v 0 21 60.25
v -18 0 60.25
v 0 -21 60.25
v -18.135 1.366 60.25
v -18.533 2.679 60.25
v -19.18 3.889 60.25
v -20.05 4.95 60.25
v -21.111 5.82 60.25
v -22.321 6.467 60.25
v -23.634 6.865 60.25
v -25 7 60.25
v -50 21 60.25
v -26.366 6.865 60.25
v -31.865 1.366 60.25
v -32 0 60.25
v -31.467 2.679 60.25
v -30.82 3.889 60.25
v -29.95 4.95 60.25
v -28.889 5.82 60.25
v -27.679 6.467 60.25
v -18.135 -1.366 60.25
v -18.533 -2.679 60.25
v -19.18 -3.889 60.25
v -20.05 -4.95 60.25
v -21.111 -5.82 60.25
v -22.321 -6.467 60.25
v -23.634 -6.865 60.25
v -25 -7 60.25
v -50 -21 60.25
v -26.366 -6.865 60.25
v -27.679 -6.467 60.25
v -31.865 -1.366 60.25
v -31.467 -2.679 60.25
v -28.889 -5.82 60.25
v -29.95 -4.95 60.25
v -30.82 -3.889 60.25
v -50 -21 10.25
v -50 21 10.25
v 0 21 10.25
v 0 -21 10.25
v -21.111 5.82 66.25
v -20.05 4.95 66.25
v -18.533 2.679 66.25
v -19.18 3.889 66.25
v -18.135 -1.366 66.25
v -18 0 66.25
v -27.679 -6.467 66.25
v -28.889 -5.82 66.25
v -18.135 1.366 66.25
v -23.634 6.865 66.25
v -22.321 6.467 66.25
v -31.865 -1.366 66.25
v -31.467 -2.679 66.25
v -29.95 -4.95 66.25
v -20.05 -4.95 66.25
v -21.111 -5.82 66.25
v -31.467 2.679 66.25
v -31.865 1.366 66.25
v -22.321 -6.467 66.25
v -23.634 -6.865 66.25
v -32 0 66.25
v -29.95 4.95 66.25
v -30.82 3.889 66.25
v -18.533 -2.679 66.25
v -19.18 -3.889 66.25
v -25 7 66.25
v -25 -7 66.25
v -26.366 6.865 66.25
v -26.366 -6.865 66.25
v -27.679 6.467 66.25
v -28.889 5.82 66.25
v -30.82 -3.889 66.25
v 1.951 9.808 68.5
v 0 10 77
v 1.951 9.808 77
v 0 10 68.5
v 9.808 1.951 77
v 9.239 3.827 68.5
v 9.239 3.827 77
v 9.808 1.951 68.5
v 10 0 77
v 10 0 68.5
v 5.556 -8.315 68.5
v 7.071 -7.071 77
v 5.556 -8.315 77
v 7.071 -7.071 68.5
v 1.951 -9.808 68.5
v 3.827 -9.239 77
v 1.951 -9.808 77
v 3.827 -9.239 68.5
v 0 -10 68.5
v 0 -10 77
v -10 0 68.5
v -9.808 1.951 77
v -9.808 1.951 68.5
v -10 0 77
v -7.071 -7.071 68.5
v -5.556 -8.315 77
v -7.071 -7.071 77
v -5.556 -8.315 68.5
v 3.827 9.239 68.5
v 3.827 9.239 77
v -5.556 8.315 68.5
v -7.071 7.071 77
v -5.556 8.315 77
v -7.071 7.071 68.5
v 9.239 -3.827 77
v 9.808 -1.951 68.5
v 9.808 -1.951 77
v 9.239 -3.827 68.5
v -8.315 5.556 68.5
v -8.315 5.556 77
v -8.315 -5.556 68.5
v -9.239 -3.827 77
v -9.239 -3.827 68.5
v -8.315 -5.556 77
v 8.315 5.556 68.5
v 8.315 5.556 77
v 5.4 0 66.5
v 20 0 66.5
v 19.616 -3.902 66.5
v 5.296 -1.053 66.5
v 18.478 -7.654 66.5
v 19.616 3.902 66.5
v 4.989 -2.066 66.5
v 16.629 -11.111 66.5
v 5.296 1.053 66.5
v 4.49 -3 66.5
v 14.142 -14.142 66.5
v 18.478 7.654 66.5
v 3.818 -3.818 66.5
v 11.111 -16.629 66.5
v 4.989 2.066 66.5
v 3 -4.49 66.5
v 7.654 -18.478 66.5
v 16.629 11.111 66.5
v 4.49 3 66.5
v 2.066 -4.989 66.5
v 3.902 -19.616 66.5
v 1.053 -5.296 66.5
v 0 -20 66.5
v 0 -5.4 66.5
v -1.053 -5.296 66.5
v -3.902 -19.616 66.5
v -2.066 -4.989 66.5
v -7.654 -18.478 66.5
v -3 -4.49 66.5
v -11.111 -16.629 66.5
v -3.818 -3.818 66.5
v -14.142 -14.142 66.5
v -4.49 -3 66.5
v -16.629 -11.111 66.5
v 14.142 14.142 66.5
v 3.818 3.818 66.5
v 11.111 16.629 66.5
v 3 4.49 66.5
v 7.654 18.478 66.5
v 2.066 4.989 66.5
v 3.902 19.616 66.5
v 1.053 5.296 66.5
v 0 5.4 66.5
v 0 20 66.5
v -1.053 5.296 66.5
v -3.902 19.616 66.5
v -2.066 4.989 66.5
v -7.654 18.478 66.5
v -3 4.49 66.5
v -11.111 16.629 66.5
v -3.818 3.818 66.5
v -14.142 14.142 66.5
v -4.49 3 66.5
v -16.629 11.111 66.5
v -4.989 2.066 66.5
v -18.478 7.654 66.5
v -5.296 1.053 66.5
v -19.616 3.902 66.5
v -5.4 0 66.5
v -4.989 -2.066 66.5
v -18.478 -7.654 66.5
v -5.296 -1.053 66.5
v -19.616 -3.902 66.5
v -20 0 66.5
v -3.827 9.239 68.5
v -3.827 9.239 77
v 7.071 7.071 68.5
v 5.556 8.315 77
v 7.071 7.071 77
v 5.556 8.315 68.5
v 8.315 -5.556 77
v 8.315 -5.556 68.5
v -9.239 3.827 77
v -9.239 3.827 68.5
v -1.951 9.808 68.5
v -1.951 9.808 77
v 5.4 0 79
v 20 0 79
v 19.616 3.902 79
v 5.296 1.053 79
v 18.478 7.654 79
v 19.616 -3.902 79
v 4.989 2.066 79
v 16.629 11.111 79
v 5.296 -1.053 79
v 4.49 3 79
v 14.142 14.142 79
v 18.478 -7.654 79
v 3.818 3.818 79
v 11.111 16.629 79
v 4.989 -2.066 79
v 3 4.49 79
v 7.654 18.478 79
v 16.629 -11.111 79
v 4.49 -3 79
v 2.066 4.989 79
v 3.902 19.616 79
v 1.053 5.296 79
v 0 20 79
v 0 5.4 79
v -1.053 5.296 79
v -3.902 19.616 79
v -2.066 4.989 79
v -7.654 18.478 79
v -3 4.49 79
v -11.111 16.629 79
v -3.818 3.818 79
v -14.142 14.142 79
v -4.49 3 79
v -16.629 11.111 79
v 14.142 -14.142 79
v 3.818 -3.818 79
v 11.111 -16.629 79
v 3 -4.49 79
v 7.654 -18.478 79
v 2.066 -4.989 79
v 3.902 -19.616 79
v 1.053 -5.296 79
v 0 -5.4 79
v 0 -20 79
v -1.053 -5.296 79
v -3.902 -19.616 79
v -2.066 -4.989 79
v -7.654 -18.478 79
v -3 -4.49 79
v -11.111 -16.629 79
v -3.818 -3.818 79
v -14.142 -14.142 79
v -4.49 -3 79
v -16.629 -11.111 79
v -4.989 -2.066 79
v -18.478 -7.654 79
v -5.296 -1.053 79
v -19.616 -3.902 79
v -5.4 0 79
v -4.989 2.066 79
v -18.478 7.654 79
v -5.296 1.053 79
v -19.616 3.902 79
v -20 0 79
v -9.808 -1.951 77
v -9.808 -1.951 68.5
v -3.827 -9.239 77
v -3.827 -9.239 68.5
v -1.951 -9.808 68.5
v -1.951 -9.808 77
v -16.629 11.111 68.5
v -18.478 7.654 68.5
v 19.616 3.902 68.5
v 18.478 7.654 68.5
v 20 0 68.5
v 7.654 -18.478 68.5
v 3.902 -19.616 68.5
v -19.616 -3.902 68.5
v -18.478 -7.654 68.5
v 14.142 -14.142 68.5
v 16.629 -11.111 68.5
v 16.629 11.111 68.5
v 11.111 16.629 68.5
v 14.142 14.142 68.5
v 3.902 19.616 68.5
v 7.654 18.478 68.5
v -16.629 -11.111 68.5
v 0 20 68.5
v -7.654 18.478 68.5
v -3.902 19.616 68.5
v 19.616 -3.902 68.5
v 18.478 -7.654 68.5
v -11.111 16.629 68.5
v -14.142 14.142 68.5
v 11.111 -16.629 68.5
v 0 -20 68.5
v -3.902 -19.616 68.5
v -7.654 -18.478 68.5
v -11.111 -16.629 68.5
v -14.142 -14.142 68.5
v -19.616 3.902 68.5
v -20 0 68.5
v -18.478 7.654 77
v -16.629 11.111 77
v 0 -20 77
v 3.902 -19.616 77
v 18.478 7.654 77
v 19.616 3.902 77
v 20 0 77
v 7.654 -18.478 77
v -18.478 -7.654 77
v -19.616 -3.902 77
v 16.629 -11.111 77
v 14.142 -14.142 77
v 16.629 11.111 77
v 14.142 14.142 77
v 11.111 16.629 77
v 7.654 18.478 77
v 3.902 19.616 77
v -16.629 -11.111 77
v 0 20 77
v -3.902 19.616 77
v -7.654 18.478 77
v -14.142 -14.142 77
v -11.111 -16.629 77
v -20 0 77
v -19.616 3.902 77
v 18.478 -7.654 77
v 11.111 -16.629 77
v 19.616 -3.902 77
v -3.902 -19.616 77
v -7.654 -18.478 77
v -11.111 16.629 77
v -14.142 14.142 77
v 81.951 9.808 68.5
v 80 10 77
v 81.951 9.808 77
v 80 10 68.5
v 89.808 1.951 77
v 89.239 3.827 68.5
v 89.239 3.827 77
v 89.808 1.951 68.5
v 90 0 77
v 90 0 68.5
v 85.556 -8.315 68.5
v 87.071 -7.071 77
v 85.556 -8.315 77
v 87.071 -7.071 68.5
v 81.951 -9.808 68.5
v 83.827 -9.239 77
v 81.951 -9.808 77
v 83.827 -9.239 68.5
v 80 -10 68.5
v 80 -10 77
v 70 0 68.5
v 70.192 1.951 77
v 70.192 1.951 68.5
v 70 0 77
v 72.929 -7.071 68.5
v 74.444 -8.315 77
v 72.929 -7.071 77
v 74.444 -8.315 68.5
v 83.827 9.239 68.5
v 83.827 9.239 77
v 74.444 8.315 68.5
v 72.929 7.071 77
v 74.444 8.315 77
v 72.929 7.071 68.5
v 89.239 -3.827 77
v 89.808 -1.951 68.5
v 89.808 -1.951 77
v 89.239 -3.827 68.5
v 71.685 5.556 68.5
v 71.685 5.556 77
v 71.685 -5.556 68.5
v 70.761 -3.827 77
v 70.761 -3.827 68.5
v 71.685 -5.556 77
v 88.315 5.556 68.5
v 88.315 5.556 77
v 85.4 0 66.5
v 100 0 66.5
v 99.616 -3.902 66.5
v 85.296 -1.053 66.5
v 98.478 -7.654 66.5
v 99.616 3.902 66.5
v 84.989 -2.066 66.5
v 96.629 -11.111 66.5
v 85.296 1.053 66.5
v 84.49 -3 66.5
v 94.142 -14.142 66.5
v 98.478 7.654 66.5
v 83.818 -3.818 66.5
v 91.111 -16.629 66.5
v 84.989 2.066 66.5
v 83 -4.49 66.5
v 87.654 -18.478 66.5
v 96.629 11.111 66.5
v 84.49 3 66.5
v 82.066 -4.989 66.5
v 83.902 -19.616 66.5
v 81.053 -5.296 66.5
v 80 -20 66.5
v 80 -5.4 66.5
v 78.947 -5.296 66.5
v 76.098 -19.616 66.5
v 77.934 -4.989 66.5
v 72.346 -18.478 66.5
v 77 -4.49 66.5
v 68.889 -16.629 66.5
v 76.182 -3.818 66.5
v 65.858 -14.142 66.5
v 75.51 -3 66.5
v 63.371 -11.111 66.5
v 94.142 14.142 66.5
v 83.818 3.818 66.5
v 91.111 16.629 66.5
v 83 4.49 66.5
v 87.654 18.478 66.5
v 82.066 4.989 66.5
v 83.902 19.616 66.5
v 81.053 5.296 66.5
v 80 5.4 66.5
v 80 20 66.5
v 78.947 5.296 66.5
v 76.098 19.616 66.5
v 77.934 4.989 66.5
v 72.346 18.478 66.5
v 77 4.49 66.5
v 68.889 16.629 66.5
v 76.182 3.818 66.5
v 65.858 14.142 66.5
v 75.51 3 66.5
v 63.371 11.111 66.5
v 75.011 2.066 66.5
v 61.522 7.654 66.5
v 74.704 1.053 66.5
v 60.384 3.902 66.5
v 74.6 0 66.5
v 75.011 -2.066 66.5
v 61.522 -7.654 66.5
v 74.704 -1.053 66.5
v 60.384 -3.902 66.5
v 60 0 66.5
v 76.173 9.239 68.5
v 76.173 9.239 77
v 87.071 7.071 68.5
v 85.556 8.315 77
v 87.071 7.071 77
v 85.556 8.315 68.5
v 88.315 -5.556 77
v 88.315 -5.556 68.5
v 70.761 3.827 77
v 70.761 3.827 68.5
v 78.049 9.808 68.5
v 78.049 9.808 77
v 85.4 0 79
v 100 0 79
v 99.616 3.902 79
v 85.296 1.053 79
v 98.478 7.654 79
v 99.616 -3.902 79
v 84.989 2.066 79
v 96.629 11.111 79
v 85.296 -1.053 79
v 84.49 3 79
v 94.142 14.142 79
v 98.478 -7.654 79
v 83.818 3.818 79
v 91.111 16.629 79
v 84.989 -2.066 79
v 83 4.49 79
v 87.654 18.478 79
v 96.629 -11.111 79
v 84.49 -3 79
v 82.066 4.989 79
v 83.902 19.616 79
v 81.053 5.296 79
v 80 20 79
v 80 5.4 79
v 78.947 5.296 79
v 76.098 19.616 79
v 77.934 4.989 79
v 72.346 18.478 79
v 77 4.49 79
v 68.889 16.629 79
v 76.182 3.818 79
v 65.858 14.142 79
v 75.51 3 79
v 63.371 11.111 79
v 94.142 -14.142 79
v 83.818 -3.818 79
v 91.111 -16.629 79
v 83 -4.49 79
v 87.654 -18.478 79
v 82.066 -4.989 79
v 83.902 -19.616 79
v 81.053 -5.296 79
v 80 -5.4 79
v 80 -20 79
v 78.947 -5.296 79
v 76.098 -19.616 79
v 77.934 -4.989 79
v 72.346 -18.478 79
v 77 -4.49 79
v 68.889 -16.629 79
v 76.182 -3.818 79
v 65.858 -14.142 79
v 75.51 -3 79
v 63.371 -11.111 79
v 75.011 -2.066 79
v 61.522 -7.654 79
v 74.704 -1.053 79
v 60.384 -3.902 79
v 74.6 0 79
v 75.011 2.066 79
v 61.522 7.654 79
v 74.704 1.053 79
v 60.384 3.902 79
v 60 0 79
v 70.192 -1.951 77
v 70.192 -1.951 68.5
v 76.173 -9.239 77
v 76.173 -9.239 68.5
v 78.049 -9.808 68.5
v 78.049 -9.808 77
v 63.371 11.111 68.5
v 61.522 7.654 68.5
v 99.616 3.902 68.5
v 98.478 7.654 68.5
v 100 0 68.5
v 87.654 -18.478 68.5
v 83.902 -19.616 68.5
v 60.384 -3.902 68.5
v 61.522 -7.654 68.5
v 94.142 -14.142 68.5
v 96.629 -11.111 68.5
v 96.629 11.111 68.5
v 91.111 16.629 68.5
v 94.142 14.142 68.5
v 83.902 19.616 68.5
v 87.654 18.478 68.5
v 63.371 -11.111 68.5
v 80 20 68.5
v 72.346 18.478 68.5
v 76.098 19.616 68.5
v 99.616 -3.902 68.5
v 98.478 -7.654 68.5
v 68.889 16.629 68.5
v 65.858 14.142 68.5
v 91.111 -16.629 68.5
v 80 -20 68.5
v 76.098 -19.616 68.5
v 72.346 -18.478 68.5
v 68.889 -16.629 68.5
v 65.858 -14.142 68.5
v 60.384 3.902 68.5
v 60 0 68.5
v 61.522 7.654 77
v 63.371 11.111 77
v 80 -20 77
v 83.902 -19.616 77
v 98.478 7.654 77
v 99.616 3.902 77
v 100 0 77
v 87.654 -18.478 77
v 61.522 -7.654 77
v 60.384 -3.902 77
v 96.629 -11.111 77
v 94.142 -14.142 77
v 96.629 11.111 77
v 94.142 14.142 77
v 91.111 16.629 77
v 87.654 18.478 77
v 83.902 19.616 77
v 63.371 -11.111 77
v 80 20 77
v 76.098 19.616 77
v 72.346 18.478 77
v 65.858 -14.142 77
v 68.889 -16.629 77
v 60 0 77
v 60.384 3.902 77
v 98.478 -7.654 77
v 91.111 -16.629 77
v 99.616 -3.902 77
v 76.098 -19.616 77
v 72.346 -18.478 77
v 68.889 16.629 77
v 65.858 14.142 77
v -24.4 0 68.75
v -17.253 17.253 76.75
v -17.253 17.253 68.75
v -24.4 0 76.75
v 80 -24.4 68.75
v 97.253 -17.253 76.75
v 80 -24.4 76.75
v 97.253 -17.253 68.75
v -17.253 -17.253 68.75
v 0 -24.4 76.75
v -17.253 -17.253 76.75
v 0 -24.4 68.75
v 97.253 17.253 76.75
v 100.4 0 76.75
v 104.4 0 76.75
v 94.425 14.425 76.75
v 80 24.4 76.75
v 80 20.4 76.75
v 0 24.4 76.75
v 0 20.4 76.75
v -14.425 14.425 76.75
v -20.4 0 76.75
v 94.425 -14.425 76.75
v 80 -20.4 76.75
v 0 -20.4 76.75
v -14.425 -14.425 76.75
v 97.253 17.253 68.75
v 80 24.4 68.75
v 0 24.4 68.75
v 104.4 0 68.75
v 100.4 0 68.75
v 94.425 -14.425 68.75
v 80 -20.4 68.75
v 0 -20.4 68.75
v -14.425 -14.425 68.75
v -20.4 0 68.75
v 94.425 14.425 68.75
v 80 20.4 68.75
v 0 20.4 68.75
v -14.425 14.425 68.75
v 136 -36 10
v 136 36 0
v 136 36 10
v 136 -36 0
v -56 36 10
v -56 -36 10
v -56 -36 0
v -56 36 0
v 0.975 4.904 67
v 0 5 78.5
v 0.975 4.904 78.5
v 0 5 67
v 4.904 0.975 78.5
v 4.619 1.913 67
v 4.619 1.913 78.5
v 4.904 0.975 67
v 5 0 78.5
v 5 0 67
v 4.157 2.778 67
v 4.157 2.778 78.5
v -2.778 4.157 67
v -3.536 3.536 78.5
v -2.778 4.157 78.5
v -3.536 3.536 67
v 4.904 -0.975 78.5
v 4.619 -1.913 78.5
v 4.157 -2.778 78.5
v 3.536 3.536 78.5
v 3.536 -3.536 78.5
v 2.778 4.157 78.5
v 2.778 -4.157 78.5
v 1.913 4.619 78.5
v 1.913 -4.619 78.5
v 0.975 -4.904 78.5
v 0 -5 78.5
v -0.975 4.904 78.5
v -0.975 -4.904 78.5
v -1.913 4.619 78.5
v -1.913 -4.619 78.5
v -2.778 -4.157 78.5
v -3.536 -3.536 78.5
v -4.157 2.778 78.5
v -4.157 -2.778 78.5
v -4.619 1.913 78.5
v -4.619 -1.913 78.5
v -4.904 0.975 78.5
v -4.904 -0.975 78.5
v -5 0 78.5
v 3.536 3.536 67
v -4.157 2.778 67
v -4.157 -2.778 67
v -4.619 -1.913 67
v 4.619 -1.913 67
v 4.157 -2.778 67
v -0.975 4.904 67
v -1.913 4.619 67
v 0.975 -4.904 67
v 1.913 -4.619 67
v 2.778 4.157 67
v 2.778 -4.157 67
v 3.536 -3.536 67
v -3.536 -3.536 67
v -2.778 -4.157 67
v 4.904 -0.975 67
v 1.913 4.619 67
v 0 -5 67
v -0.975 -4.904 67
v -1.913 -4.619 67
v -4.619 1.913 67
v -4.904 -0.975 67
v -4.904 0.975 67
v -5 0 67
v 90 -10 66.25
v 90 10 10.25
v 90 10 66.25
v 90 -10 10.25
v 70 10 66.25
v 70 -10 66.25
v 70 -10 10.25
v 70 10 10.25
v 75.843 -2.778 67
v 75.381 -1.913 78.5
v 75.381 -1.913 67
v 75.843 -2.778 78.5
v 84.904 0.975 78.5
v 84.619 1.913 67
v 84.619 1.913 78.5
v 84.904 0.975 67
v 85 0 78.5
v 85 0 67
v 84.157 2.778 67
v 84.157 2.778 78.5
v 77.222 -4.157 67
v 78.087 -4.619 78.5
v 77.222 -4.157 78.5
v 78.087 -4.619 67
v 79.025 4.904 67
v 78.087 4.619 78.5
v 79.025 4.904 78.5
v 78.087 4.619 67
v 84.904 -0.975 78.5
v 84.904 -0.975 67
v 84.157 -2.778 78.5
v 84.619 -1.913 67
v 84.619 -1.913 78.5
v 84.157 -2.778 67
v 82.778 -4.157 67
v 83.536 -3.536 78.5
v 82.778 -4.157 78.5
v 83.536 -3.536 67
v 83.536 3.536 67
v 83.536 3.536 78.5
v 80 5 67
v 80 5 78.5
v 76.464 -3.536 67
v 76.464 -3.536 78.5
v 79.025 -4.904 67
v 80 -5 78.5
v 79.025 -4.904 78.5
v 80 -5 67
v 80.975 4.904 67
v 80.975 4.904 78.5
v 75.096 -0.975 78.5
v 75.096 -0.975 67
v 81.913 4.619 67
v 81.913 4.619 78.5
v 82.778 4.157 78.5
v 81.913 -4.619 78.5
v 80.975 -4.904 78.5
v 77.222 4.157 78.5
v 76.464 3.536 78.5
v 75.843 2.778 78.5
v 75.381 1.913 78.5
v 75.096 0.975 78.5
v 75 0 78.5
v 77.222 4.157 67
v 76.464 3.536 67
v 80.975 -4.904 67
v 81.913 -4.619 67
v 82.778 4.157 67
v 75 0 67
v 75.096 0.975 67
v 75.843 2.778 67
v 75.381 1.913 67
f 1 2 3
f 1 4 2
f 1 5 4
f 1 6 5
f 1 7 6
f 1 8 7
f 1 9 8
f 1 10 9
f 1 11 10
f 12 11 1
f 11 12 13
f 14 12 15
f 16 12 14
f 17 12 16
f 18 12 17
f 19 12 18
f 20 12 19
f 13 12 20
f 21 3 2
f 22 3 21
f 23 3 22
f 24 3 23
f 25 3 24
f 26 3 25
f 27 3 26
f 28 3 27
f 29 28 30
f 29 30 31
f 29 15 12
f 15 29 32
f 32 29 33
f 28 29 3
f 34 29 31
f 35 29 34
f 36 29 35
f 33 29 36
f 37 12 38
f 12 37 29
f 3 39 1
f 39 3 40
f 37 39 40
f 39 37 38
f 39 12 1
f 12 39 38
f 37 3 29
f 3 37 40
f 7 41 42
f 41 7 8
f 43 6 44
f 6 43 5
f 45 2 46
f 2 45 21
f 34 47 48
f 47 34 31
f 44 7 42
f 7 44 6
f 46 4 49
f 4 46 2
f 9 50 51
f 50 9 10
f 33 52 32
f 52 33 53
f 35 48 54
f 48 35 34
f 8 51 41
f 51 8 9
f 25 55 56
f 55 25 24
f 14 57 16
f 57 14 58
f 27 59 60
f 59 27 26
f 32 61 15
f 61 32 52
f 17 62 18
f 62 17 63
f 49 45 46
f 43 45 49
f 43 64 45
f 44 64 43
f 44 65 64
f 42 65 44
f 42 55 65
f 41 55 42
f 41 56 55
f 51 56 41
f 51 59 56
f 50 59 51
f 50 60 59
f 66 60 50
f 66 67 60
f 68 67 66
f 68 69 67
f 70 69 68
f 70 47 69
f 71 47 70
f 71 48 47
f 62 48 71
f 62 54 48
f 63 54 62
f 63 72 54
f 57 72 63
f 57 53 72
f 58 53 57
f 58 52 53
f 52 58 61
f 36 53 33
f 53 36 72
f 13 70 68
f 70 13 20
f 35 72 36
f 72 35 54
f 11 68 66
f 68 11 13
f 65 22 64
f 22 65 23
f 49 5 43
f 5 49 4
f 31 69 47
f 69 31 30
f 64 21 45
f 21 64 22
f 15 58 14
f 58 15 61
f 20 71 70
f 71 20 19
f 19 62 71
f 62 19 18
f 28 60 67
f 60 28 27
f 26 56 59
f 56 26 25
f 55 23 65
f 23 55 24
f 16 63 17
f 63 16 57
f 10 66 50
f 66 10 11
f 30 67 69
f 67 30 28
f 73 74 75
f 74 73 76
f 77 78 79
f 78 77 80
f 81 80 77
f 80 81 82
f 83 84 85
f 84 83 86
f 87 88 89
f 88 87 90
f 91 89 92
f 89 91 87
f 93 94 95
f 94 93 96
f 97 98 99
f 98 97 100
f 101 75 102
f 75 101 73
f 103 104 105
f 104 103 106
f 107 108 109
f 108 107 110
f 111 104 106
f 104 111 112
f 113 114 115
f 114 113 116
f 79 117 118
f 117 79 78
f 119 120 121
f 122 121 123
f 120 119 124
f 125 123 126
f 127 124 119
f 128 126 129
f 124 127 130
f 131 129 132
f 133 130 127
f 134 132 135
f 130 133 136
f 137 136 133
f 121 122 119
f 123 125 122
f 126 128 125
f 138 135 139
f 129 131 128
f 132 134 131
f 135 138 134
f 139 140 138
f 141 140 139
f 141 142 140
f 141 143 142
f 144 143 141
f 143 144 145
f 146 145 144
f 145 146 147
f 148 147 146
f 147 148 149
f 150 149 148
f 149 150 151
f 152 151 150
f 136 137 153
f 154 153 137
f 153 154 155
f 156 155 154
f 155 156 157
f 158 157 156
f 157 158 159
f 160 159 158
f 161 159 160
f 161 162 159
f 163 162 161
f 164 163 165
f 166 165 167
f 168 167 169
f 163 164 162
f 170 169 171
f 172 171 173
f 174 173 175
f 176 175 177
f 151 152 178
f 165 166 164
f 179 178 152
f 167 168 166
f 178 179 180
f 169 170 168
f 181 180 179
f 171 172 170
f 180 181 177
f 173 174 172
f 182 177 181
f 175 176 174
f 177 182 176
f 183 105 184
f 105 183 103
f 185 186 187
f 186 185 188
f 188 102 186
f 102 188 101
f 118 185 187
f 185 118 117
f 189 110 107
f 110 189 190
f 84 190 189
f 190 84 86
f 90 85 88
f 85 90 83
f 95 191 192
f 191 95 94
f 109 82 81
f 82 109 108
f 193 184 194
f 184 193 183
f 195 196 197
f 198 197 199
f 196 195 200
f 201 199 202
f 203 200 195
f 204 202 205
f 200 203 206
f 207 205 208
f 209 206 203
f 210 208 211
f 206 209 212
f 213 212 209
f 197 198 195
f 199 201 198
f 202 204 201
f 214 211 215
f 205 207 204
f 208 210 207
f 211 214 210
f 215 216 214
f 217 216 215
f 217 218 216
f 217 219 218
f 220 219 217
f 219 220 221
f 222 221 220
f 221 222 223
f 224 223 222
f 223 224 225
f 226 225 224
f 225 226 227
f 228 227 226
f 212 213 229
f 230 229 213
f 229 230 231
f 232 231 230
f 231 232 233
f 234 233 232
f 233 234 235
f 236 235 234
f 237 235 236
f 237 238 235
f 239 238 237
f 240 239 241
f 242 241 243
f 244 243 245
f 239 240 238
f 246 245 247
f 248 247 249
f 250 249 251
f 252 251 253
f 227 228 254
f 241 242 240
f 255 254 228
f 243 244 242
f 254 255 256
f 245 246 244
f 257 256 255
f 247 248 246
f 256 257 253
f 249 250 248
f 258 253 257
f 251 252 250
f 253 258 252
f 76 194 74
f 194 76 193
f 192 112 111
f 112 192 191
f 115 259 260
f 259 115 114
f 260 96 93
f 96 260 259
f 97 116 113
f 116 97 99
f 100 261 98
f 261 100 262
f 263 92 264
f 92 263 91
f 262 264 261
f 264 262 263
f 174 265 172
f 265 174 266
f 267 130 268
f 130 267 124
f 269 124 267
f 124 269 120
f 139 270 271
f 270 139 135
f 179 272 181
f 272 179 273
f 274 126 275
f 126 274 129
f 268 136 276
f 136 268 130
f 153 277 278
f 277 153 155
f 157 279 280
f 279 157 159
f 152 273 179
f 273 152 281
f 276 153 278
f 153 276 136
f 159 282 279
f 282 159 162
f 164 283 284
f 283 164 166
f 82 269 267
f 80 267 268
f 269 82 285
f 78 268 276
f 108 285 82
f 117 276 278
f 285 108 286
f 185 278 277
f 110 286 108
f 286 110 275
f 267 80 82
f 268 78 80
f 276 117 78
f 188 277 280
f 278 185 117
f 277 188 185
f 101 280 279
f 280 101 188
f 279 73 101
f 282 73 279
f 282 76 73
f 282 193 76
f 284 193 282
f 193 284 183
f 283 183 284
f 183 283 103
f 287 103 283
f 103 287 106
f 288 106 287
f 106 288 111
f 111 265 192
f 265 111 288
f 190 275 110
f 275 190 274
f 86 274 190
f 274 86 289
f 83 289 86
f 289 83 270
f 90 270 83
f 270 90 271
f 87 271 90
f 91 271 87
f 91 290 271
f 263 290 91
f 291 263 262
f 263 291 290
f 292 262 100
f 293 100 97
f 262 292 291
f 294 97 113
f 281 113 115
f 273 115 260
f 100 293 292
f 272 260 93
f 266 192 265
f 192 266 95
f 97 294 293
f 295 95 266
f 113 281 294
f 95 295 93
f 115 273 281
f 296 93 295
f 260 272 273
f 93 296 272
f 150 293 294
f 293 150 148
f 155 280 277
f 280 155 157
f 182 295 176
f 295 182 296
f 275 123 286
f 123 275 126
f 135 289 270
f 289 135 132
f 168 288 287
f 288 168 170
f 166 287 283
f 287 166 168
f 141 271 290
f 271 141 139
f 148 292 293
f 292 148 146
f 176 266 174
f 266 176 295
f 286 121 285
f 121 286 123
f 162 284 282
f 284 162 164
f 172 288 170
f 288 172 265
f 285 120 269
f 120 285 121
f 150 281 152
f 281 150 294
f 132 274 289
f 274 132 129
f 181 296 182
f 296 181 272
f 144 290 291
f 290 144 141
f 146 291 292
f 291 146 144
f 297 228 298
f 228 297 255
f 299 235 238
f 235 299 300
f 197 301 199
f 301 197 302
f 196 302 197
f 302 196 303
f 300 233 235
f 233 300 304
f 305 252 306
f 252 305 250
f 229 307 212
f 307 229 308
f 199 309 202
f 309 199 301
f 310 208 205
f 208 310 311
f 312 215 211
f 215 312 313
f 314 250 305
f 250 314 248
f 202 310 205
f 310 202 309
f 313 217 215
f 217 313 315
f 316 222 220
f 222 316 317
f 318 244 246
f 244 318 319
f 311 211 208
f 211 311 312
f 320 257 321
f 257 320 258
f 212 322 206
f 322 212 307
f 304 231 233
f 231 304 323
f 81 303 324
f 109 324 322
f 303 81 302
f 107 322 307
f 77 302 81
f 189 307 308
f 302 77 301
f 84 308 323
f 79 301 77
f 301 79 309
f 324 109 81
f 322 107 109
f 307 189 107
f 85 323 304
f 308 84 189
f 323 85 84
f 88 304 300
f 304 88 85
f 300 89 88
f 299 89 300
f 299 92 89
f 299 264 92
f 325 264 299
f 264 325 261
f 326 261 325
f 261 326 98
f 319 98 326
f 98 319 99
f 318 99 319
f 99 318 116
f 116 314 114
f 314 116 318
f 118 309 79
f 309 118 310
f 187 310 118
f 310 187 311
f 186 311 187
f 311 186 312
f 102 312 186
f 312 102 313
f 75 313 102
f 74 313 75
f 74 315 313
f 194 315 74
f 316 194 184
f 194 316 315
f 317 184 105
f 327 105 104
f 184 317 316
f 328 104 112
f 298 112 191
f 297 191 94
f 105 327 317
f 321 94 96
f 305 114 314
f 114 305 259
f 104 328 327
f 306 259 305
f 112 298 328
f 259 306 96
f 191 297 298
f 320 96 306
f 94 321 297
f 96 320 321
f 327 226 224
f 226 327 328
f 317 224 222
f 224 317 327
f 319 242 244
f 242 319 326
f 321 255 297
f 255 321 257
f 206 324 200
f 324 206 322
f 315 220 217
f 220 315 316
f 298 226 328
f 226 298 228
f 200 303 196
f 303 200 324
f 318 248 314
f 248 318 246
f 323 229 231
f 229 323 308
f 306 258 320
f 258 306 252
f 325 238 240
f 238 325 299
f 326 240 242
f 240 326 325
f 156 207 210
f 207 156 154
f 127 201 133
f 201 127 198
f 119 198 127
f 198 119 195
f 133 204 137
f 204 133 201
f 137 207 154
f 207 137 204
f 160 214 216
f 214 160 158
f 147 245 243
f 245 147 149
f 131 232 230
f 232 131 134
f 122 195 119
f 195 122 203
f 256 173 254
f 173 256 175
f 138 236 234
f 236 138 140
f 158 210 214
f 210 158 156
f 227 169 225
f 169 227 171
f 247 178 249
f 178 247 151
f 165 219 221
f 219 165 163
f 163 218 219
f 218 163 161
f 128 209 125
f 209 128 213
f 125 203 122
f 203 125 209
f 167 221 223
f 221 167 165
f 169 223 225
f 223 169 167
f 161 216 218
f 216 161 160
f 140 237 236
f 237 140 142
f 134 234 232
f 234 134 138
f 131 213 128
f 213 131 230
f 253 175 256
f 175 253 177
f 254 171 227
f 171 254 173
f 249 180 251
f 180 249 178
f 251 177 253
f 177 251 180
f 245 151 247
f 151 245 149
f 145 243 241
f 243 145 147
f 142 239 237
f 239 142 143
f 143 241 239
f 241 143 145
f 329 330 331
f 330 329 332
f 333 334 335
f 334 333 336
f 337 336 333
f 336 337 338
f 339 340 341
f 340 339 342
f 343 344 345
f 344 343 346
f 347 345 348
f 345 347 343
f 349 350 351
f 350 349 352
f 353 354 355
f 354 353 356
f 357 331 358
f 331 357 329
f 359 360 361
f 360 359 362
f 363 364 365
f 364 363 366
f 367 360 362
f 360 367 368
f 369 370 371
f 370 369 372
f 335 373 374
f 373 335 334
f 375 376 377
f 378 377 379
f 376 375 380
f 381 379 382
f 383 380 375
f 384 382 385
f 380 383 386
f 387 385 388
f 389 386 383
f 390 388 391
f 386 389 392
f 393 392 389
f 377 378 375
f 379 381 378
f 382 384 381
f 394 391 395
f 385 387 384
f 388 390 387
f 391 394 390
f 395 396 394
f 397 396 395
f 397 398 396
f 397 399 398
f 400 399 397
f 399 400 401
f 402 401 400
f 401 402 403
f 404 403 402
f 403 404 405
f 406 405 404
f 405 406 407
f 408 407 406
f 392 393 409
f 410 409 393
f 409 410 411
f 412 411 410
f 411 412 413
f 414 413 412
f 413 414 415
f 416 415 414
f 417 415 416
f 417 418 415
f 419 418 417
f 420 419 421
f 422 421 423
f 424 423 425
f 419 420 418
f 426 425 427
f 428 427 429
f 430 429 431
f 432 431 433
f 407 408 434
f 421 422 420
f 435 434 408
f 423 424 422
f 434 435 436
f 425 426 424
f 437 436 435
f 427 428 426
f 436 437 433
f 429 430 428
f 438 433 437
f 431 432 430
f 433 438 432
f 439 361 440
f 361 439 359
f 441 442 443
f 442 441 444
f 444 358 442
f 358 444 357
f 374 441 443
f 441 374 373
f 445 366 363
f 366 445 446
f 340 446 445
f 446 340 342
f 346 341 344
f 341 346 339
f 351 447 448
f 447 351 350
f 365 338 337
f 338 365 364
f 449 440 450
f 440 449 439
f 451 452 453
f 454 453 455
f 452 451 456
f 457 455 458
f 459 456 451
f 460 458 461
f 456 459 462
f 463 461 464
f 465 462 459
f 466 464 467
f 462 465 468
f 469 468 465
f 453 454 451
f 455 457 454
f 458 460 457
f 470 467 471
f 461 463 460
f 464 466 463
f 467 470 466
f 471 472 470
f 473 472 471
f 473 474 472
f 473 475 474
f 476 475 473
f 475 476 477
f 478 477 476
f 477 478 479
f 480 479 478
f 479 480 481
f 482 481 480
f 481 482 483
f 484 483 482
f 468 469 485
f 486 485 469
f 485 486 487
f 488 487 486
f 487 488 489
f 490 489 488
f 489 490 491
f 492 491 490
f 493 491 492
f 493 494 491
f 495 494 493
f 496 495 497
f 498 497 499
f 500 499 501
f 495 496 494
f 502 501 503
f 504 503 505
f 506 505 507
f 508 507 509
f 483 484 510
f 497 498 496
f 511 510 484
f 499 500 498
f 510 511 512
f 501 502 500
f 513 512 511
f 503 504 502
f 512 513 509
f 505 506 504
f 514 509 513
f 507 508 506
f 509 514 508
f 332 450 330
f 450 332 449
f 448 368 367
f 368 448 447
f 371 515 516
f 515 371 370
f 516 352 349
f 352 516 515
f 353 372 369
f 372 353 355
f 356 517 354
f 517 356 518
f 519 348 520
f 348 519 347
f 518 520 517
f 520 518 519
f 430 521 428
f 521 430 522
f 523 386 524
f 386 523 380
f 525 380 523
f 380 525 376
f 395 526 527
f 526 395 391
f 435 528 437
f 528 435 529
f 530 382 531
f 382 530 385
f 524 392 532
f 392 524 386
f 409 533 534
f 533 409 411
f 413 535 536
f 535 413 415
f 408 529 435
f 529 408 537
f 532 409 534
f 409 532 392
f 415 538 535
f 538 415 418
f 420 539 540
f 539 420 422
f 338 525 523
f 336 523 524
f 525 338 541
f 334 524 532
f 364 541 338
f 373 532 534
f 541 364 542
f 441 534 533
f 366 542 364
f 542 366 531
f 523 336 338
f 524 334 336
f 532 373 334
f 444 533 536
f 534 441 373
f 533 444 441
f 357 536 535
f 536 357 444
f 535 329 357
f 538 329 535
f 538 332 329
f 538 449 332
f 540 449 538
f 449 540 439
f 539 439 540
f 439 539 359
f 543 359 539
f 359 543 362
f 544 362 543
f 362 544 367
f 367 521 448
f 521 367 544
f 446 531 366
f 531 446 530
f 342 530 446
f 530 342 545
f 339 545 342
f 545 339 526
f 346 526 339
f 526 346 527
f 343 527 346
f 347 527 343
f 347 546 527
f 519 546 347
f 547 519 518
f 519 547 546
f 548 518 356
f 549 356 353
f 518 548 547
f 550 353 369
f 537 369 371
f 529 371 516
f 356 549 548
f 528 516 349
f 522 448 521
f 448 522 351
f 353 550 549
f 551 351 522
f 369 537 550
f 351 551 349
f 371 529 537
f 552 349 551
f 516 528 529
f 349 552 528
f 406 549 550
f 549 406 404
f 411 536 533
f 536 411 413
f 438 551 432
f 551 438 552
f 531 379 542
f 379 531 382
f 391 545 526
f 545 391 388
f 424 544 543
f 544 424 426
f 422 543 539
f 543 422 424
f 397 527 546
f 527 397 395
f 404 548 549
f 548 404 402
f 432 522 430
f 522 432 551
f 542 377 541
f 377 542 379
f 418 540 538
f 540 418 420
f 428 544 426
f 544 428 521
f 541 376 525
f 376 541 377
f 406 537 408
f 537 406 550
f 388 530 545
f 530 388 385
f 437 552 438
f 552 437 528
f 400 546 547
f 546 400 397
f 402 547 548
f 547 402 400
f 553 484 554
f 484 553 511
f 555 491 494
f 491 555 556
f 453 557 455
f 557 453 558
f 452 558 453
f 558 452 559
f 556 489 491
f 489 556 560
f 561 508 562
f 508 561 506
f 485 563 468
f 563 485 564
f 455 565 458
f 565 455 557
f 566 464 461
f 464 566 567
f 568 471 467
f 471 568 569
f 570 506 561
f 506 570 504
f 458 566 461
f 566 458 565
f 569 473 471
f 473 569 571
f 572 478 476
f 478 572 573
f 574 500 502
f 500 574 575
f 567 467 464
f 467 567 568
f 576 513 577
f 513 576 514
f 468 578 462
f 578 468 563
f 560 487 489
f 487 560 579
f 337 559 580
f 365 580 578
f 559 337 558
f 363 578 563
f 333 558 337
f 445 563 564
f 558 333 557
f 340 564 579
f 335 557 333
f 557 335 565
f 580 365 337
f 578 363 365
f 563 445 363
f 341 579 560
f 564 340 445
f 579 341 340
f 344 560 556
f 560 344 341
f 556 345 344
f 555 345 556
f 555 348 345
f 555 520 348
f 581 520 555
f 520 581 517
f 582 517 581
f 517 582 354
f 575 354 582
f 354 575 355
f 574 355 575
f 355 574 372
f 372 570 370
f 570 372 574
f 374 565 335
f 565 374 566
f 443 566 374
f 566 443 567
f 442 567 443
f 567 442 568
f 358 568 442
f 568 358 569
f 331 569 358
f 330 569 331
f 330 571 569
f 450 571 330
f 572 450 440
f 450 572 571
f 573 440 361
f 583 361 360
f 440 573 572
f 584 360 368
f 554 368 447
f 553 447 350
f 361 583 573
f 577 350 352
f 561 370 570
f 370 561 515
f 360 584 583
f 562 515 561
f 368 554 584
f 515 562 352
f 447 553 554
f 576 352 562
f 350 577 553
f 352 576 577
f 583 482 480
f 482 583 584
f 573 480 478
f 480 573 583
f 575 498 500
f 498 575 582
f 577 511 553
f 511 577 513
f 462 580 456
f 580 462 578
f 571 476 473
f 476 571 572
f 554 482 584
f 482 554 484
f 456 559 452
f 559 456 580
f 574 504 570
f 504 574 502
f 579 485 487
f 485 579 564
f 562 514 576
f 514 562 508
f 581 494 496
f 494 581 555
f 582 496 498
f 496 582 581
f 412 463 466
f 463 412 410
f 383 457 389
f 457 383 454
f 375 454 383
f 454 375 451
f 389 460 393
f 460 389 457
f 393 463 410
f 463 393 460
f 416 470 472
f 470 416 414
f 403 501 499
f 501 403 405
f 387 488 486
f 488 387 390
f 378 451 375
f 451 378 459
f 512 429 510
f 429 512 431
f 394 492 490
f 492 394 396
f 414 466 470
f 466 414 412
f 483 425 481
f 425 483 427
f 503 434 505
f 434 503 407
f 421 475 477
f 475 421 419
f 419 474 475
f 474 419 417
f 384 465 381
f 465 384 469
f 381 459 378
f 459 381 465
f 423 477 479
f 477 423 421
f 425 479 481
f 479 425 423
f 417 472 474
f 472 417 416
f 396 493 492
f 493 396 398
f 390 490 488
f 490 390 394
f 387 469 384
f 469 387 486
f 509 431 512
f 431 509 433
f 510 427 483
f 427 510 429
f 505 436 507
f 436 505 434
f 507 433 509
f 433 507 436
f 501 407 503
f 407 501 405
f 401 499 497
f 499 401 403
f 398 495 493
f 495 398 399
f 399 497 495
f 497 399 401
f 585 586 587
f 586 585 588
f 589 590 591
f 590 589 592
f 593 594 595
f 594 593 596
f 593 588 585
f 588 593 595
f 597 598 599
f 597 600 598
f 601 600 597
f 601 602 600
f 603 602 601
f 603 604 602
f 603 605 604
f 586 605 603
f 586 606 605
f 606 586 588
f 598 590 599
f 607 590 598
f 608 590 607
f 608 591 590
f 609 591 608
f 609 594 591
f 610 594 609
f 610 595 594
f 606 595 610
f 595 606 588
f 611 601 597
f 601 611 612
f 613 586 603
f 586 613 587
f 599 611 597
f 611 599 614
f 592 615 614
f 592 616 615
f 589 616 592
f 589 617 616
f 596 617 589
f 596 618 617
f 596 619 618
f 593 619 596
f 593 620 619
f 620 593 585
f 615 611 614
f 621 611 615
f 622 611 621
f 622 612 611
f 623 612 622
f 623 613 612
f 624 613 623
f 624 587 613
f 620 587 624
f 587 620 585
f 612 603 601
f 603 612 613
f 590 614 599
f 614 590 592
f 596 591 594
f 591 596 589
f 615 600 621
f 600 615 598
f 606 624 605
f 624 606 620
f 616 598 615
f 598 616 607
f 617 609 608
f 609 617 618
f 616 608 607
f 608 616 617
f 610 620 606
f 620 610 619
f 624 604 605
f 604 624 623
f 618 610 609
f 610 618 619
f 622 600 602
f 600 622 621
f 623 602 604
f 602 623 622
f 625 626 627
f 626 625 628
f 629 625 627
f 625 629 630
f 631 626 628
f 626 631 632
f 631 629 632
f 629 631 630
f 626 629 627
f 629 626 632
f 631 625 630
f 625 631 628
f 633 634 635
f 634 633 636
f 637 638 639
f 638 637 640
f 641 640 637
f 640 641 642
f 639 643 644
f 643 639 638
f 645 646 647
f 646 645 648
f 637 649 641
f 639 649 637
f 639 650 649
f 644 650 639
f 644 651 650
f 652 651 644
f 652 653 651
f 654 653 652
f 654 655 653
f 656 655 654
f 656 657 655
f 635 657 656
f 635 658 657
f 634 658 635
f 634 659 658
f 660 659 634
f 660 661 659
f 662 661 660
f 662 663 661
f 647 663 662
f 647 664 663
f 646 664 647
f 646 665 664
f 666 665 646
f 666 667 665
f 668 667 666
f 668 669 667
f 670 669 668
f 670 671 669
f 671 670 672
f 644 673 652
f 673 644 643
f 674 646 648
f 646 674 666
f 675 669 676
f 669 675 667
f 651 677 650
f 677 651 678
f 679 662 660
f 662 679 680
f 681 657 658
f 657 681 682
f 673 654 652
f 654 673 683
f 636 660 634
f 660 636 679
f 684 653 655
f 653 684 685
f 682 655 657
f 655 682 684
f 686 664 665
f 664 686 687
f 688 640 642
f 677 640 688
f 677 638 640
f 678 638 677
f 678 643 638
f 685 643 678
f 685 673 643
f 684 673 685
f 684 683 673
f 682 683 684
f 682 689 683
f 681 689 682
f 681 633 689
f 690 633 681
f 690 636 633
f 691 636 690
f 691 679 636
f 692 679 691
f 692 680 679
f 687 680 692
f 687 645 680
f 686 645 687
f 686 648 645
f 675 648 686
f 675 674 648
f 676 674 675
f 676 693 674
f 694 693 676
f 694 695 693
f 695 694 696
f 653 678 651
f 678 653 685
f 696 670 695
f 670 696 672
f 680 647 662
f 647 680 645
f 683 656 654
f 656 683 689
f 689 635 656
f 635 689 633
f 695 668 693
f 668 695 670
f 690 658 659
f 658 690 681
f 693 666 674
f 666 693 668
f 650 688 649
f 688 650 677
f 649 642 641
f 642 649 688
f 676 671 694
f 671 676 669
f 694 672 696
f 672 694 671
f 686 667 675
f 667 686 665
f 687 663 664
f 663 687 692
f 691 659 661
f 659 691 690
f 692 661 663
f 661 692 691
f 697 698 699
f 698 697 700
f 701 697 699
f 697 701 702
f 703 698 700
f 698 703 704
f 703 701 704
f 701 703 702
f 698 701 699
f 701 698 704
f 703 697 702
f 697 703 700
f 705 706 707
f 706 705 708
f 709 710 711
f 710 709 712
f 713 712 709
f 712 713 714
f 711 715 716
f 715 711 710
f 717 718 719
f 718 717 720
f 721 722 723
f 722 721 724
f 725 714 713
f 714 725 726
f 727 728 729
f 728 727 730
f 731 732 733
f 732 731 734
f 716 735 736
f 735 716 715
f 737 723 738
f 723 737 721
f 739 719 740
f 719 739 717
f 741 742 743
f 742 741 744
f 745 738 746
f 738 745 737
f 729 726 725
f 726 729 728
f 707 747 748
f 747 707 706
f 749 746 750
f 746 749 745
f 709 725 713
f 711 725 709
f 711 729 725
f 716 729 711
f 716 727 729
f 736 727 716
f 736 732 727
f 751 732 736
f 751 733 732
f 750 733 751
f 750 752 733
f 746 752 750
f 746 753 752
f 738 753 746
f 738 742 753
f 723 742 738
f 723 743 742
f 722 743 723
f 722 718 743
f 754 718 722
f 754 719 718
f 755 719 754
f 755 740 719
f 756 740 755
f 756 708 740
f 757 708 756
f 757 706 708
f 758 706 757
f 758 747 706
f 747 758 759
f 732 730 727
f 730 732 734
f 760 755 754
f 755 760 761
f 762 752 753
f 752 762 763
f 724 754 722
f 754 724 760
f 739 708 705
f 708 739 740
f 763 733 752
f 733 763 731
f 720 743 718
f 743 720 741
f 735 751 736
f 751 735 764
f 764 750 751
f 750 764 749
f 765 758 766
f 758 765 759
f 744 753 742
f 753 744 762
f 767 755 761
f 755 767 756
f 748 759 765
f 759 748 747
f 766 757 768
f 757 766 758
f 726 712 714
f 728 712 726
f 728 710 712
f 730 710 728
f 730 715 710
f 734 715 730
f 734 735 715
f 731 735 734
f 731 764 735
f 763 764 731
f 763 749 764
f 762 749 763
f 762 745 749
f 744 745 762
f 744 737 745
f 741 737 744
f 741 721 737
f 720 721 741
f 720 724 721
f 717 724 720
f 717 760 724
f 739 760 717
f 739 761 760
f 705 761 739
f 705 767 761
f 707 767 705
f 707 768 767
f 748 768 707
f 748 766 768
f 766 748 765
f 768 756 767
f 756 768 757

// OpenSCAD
$fn = 32;

// ------------------------------------------------------------------------
// Motor belt drive: span 80 mm, pulleys d40, belt 8 mm wide
// Every part is its own module, assembly() places every instance.
// ------------------------------------------------------------------------

// --- part 1 ---
module base_plate() {
  difference() {
    translate([-96, -36, 0]) cube([192, 72, 10]);
  }
}

// --- part 2 ---
module motor() {
  union() {
    translate([-25, -21, 0]) cube([50, 42, 50]);
    translate([28, 0, 25]) rotate([0, 90, 0]) cylinder(h = 6, d = 14, center = true);
  }
}

// --- part 3 ---
module drive_shaft() {
  translate([0, 0, -5.75]) cylinder(h = 11.5, d = 10);
}

// --- part 4 ---
module pulley_drive() {
  difference() {
    union() {
      cylinder(h = 12.5, d = 20);
      cylinder(h = 2, d = 40);
      translate([0, 0, 10.5]) cylinder(h = 2, d = 40);
    }
    translate([0, 0, -1]) cylinder(h = 14.5, d = 10.8);
  }
}

// --- part 5 ---
module idler_post() {
  translate([-10, -10, 0]) cube([20, 20, 56]);
}

// --- part 6 ---
module driven_shaft() {
  translate([0, 0, -5.75]) cylinder(h = 11.5, d = 10);
}

// --- part 7 ---
module pulley_driven() {
  difference() {
    union() {
      cylinder(h = 12.5, d = 20);
      cylinder(h = 2, d = 40);
      translate([0, 0, 10.5]) cylinder(h = 2, d = 40);
    }
    translate([0, 0, -1]) cylinder(h = 14.5, d = 10.8);
  }
}

// --- part 8 ---
module drive_belt() {
  difference() {
    linear_extrude(height = 8) polygon(points = concat([for (a = [90 : 45 : 270]) [24.4 * cos(a), 24.4 * sin(a)]], [for (a = [270 : 45 : 450]) [80 + 24.4 * cos(a), 24.4 * sin(a)]]));
    translate([0, 0, -1]) linear_extrude(height = 10) polygon(points = concat([for (a = [90 : 45 : 270]) [20.4 * cos(a), 20.4 * sin(a)]], [for (a = [270 : 45 : 450]) [80 + 20.4 * cos(a), 20.4 * sin(a)]]));
  }
}

// --- assembly ---
module assembly() {
  color([0.80, 0.24, 0.20]) translate([40, 0, 0]) rotate([0, 0, 0]) base_plate();
  color([0.20, 0.45, 0.75]) translate([0, 0, 35.25]) rotate([0, 270, 0]) motor();
  color([0.25, 0.62, 0.32]) translate([0, 0, 72.75]) rotate([0, 0, 0]) drive_shaft();
  color([0.92, 0.70, 0.18]) translate([0, 0, 66.5]) rotate([0, 0, 0]) pulley_drive();
  color([0.58, 0.35, 0.70]) translate([80, 0, 10.25]) rotate([0, 0, 0]) idler_post();
  color([0.16, 0.66, 0.66]) translate([80, 0, 72.75]) rotate([0, 0, 0]) driven_shaft();
  color([0.85, 0.48, 0.18]) translate([80, 0, 66.5]) rotate([0, 0, 0]) pulley_driven();
  color([0.55, 0.60, 0.65]) translate([0, 0, 68.75]) rotate([0, 0, 0]) drive_belt();
}

assembly();
